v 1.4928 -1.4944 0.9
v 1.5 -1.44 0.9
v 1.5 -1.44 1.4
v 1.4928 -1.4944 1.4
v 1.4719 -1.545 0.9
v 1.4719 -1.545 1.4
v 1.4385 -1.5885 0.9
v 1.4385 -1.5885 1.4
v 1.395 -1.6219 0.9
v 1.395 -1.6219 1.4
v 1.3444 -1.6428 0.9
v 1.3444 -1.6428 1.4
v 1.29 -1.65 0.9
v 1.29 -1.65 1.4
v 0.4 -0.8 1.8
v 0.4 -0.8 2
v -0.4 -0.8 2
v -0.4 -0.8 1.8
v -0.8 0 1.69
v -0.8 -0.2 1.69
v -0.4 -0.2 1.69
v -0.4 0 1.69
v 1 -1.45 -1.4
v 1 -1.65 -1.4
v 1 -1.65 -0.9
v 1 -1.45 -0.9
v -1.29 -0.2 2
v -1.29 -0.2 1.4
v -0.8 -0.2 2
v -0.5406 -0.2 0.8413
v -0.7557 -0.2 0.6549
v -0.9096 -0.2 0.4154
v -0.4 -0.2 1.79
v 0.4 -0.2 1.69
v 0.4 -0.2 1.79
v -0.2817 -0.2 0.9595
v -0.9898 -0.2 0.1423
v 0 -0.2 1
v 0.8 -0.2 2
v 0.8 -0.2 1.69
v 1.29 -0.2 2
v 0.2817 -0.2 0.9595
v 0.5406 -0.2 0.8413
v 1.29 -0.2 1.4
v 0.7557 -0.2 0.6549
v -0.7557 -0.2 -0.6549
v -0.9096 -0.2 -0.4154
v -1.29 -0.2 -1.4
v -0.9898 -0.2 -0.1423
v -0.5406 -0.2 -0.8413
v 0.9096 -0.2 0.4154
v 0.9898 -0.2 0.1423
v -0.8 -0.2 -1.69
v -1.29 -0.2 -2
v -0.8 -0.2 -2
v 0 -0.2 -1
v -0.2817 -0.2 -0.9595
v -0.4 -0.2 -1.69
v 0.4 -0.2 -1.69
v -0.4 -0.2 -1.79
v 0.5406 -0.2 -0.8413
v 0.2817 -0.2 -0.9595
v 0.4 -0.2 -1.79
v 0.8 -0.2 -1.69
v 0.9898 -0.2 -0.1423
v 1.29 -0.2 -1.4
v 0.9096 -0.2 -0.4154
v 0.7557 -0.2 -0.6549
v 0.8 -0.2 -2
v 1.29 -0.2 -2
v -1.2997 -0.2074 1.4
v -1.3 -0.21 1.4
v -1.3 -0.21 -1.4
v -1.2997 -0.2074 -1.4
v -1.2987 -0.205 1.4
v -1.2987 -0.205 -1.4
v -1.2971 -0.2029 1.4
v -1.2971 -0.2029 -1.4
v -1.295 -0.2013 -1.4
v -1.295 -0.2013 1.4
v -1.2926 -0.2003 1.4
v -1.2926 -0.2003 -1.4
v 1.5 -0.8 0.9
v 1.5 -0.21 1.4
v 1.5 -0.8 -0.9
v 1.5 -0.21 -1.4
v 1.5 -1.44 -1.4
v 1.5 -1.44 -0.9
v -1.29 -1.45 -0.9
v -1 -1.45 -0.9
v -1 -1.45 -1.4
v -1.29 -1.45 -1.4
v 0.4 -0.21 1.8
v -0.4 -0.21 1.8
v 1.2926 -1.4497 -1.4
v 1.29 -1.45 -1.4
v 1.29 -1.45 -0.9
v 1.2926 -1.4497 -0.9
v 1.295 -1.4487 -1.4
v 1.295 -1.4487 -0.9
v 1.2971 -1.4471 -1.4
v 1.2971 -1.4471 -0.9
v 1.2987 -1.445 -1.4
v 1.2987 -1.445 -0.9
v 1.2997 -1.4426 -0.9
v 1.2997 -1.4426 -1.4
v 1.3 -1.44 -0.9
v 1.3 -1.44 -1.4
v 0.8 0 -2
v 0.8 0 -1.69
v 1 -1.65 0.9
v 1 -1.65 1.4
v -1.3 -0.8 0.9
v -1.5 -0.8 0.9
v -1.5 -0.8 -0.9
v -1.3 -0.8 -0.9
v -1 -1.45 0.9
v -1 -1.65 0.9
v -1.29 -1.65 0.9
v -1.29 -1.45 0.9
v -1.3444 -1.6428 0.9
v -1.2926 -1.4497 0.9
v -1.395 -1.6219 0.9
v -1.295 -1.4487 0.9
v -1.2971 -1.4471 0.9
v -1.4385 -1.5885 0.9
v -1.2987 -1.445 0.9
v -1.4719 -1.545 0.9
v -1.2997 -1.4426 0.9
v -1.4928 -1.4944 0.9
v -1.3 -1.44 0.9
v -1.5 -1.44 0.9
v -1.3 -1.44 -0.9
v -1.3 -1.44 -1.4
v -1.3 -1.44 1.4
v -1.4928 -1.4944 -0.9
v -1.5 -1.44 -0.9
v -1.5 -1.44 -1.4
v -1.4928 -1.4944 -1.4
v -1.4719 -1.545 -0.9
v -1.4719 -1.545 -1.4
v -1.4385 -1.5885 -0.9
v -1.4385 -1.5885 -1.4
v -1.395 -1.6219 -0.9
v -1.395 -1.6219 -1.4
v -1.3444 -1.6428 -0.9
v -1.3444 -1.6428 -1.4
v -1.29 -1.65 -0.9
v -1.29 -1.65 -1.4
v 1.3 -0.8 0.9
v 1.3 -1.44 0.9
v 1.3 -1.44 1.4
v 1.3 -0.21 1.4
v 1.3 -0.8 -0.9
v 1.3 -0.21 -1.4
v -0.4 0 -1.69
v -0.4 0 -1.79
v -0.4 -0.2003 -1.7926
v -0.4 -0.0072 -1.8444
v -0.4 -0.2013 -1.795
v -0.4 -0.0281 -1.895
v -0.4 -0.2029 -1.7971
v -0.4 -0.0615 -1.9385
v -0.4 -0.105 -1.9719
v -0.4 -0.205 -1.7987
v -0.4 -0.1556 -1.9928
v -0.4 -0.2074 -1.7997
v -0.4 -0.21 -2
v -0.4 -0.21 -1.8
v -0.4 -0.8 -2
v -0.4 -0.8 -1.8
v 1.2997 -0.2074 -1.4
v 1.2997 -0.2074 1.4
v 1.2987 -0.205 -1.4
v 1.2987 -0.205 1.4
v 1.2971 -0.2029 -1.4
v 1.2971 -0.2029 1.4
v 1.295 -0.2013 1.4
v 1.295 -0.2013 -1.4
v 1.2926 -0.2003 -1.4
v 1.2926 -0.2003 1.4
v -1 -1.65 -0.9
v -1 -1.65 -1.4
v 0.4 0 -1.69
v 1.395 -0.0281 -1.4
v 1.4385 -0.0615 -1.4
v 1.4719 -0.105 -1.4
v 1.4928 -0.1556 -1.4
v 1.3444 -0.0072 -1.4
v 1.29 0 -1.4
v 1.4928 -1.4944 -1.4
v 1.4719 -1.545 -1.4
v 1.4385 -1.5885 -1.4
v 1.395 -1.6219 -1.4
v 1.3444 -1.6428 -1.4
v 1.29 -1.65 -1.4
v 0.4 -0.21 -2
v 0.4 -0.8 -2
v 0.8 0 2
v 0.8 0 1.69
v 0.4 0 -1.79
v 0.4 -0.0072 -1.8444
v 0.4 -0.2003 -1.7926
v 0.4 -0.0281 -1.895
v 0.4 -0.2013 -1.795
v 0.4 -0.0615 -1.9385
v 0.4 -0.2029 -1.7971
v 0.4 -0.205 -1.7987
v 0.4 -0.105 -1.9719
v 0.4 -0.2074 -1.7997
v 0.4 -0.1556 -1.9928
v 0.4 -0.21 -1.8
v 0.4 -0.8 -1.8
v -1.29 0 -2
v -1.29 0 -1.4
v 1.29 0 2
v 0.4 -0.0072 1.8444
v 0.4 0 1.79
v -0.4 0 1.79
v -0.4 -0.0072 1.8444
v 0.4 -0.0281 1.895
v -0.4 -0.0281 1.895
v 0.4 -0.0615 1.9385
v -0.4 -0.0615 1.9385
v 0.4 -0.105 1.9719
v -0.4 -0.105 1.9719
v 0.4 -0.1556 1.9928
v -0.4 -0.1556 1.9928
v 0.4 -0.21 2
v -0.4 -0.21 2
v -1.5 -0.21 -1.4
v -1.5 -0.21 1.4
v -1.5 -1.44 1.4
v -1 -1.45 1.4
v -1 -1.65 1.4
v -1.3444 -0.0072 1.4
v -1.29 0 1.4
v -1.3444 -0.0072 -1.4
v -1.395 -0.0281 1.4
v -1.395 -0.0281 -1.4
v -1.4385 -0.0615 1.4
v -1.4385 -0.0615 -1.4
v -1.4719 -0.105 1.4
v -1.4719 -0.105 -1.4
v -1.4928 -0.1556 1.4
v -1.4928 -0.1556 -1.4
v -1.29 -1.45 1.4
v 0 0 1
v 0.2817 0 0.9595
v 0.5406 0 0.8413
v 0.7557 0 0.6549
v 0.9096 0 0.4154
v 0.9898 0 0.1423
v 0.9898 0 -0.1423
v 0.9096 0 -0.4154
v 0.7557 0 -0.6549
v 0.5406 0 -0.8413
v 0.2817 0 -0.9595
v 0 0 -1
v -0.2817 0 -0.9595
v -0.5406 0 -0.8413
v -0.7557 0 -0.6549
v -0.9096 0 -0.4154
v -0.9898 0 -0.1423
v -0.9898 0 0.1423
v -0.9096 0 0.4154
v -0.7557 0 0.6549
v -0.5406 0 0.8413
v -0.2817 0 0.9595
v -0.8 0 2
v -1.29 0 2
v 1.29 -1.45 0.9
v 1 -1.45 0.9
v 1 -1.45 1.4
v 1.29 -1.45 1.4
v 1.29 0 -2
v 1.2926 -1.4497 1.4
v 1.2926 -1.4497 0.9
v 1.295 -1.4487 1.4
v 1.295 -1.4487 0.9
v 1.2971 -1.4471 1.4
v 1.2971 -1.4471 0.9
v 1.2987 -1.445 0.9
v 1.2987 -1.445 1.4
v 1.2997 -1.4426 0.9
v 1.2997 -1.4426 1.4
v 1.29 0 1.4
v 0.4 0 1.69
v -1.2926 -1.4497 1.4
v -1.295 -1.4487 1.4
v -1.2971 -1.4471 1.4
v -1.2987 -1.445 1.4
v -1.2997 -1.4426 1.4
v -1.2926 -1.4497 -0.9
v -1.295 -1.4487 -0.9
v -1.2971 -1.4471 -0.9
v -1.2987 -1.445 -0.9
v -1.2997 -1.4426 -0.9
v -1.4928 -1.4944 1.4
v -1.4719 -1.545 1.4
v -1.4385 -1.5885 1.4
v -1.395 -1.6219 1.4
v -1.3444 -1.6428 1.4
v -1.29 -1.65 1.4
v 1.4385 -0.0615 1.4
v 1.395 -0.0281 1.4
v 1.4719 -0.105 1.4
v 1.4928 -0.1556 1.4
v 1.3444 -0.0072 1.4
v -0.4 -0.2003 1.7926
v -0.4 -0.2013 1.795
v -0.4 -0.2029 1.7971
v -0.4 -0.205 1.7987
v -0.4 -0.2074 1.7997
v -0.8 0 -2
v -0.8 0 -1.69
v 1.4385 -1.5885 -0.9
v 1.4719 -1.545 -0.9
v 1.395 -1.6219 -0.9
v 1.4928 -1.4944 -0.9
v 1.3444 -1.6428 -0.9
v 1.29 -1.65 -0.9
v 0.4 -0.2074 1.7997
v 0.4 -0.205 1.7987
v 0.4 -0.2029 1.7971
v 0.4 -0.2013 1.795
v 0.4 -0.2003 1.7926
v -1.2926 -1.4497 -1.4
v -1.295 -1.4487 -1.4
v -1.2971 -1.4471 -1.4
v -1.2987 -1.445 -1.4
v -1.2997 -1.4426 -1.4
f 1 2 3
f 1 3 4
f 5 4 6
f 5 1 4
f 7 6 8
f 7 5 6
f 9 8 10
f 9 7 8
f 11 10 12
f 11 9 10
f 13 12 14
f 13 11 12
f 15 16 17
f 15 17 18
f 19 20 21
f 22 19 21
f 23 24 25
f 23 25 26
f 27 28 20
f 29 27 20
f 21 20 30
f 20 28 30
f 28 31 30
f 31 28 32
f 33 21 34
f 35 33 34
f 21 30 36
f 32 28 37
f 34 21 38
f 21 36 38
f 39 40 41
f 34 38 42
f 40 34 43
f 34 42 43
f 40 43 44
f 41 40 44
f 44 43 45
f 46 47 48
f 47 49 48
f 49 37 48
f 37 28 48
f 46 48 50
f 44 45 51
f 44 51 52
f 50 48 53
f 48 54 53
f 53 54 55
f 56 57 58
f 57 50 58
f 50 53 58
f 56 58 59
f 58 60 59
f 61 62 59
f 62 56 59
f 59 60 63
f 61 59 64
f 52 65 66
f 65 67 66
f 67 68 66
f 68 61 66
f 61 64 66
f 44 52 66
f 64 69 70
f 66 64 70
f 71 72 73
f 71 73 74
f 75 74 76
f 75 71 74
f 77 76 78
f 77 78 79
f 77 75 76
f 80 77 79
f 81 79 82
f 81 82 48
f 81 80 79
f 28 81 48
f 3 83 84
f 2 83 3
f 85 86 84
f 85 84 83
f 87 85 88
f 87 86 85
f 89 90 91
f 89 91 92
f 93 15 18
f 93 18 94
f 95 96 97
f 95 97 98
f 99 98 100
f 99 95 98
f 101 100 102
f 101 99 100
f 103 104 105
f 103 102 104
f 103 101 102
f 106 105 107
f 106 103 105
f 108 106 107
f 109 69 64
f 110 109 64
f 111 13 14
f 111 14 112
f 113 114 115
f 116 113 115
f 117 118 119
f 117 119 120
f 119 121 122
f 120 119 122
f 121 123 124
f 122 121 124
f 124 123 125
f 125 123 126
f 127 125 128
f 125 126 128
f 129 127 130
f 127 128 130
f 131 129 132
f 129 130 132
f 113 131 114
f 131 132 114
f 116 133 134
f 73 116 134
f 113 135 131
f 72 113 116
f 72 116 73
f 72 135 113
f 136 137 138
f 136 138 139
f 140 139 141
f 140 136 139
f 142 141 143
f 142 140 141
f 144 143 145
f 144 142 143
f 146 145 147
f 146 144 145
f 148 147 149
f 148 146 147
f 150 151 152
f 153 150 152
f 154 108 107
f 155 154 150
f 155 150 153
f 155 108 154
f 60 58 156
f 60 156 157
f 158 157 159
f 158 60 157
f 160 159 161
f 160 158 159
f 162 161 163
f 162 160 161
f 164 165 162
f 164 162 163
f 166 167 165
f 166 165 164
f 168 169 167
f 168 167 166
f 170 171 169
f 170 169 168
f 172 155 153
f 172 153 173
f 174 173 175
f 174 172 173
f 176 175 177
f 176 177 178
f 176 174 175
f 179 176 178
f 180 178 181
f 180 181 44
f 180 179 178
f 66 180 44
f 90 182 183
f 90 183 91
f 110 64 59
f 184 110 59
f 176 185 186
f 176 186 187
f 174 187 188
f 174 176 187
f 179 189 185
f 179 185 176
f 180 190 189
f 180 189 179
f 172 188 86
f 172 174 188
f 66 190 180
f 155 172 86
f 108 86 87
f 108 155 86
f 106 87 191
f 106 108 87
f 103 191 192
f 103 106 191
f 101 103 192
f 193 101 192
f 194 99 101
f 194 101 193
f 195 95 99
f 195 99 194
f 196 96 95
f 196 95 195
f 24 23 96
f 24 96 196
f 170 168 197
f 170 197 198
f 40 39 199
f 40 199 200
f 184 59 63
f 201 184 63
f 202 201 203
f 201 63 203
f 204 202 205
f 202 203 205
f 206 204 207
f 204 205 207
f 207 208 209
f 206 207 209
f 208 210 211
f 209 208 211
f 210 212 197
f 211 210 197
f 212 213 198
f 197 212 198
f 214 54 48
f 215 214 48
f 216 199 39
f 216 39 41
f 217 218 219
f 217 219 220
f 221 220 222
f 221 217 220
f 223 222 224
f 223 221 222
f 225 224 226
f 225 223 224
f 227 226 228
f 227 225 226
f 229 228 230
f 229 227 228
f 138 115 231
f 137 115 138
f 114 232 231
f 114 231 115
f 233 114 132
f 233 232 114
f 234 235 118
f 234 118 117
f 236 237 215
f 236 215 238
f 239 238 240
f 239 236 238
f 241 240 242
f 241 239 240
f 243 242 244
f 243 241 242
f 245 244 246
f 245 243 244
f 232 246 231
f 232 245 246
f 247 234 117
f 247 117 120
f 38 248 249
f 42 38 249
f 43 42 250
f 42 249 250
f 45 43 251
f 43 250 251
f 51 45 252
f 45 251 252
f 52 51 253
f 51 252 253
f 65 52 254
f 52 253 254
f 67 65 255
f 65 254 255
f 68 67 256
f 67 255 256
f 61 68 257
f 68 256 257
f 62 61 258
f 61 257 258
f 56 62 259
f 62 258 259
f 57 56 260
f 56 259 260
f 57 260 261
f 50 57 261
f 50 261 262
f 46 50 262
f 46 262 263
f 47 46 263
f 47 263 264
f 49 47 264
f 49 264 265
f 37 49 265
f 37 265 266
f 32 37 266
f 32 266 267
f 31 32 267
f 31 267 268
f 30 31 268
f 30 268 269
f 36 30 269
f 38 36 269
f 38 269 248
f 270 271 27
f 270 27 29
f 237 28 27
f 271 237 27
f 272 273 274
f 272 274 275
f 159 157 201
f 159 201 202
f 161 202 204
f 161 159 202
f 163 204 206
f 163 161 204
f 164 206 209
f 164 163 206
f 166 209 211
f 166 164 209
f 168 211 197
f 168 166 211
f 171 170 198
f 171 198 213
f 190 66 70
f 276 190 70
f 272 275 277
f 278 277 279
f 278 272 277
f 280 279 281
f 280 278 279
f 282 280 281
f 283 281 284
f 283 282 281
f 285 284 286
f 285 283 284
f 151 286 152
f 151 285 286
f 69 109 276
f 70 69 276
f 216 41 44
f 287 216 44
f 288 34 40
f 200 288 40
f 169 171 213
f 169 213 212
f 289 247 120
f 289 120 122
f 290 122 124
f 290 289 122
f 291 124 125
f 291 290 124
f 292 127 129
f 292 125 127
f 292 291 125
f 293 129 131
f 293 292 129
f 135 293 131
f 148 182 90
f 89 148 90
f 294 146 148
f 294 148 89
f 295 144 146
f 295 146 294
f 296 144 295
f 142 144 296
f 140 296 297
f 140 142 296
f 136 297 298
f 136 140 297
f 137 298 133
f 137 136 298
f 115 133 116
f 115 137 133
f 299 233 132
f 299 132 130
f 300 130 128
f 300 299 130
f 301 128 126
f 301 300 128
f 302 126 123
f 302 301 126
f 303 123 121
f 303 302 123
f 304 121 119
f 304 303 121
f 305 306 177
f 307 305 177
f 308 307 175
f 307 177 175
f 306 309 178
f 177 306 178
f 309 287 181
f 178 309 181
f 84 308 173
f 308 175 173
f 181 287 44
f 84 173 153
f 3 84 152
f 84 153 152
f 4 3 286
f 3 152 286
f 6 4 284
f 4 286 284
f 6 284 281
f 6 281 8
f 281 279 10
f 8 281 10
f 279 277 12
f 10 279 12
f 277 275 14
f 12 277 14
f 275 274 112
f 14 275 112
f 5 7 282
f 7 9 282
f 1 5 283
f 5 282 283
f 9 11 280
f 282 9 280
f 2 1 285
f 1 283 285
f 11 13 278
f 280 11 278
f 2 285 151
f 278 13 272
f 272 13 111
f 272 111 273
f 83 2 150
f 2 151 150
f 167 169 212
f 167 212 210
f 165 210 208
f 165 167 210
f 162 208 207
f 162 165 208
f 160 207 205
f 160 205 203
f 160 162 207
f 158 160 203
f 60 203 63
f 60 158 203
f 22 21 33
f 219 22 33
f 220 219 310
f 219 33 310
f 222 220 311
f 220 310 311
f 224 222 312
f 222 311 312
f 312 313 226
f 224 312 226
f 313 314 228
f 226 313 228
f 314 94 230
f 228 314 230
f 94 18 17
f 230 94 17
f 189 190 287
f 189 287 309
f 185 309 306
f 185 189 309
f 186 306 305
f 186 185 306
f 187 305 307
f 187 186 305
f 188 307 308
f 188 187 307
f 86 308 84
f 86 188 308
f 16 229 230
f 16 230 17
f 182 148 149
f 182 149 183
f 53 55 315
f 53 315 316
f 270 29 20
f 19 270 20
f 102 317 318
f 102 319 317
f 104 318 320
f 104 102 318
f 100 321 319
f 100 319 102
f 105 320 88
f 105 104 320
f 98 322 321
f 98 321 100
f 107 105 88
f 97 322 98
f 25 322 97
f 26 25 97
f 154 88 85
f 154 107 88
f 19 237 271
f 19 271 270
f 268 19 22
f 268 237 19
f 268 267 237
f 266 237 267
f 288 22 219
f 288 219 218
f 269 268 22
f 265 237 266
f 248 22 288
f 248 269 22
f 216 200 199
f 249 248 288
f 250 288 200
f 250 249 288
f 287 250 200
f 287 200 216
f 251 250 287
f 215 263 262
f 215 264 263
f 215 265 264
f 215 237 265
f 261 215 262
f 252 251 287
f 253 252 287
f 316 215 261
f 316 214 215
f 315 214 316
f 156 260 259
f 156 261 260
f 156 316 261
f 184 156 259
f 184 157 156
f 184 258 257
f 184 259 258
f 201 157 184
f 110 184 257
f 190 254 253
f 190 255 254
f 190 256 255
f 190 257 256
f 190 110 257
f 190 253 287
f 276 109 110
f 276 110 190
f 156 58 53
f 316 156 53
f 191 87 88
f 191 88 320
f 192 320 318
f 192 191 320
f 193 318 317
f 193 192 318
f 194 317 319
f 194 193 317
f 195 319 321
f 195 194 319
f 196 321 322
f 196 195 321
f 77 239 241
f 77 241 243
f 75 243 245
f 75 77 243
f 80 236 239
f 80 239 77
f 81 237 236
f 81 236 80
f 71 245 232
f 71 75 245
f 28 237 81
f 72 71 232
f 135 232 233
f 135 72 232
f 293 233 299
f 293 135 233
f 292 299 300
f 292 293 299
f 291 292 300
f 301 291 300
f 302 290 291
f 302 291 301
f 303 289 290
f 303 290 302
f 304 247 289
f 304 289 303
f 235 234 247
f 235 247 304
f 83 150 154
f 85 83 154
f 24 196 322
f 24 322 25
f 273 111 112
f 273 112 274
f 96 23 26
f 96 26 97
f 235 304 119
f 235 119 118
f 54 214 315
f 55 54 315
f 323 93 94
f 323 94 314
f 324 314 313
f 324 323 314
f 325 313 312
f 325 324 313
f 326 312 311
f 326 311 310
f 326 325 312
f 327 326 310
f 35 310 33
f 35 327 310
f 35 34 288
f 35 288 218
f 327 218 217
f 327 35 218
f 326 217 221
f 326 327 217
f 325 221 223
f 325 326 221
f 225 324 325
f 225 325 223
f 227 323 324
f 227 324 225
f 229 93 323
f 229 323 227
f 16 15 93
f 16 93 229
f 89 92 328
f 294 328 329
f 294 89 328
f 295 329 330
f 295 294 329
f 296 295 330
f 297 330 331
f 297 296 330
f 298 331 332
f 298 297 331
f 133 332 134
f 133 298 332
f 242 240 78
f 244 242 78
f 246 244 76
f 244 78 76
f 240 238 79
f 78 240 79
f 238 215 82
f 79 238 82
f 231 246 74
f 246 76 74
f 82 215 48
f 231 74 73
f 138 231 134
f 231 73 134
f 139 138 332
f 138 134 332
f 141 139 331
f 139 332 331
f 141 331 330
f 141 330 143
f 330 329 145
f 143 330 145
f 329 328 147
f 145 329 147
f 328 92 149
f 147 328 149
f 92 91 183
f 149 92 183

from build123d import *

# Parameters (mm, degrees)
SKETCH1_W                       = 3
SKETCH1_H                       = 4
BASE_FLANGE1_DEPTH              = 0.2
EDGE_FLANGE1_STRIP_W            = 0.82
EDGE_FLANGE1_STRIP_H            = 0.2
EDGE_FLANGE1_STRIP_CUT_DEPTH    = 0.8
EDGE_FLANGE1_RELIEF_W           = 0.92
EDGE_FLANGE1_RELIEF_H           = 0.4
EDGE_FLANGE1_RELIEF_CUT_DEPTH   = 0.2
EDGE_FLANGE1_STRIP_2_W          = 0.82
EDGE_FLANGE1_STRIP_2_H          = 0.2
EDGE_FLANGE1_STRIP_CUT_2_DEPTH  = 0.8
EDGE_FLANGE1_RELIEF_2_W         = 0.92
EDGE_FLANGE1_RELIEF_2_H         = 0.4
EDGE_FLANGE1_RELIEF_CUT_2_DEPTH = 0.2
EDGE_FLANGE1_DEPTH              = 0.8
EDGE_FLANGE1_BEND_DEPTH         = 0.8
EDGE_FLANGE2_STRIP_W            = 0.82
EDGE_FLANGE2_STRIP_H            = 0.2
EDGE_FLANGE2_STRIP_CUT_DEPTH    = 2.8
EDGE_FLANGE2_RELIEF_W           = 0.82
EDGE_FLANGE2_RELIEF_H           = 0.6
EDGE_FLANGE2_RELIEF_CUT_DEPTH   = 0.2
EDGE_FLANGE2_STRIP_2_W          = 0.82
EDGE_FLANGE2_STRIP_2_H          = 0.2
EDGE_FLANGE2_STRIP_CUT_2_DEPTH  = 2.8
EDGE_FLANGE2_RELIEF_2_W         = 0.82
EDGE_FLANGE2_RELIEF_2_H         = 0.6
EDGE_FLANGE2_RELIEF_CUT_2_DEPTH = 0.2
EDGE_FLANGE2_DEPTH              = 2.8
EDGE_FLANGE2_BEND_DEPTH         = 2.8
EDGE_FLANGE3_STRIP_W            = 0.82
EDGE_FLANGE3_STRIP_H            = 0.2
EDGE_FLANGE3_STRIP_CUT_DEPTH    = 2.8
EDGE_FLANGE3_STRIP_2_W          = 0.82
EDGE_FLANGE3_STRIP_2_H          = 0.2
EDGE_FLANGE3_STRIP_CUT_2_DEPTH  = 2.8
EDGE_FLANGE3_DEPTH              = 2.8
EDGE_FLANGE3_BEND_DEPTH         = 2.8
CUT_EXTRUDE1_DEPTH              = 10
CUT_EXTRUDE1_DEPTH_BACK         = 10
SKETCH23_W                      = 1.8
SKETCH23_H                      = 0.85
SKETCH24_R                      = 1
CUT_EXTRUDE2_DEPTH              = 10


# Sheet-metal steps are written as plain solids
with BuildPart() as part:
    # Sketch1 → Base-Flange1 (new body)
    with BuildSketch(Plane(origin=(0, 0, 0), x_dir=(1, 0, 0), z_dir=(0, 1, 0))):
        Rectangle(SKETCH1_W, SKETCH1_H)
    extrude(amount=-BASE_FLANGE1_DEPTH)

    # Edge-Flange1 strip (across the edge) → Edge-Flange1 strip cut (cut)
    with BuildSketch(Plane(origin=(0.4, -0.2, 2), x_dir=(0, 0, -1), z_dir=(-1, 0, 0))):
        with Locations((-0.2, -0.1)):
            Rectangle(EDGE_FLANGE1_STRIP_W, EDGE_FLANGE1_STRIP_H)
    extrude(amount=EDGE_FLANGE1_STRIP_CUT_DEPTH, mode=Mode.SUBTRACT)

    # Edge-Flange1 relief (on the sheet) → Edge-Flange1 relief cut (cut)
    with BuildSketch(Plane(origin=(0.4, -0.2, 1.79), x_dir=(0, 0, -1), z_dir=(0, -1, 0))):
        with Locations((-0.36, 0.2)):
            Rectangle(EDGE_FLANGE1_RELIEF_W, EDGE_FLANGE1_RELIEF_H)
        with Locations((-0.36, -1)):
            Rectangle(EDGE_FLANGE1_RELIEF_W, EDGE_FLANGE1_RELIEF_H)
    extrude(amount=-EDGE_FLANGE1_RELIEF_CUT_DEPTH, mode=Mode.SUBTRACT)

    # Edge-Flange1 strip 2 (across the edge) → Edge-Flange1 strip cut 2 (cut)
    with BuildSketch(Plane(origin=(-0.4, -0.2, -2), x_dir=(0, 0, 1), z_dir=(1, 0, 0))):
        with Locations((-0.2, -0.1)):
            Rectangle(EDGE_FLANGE1_STRIP_2_W, EDGE_FLANGE1_STRIP_2_H)
    extrude(amount=EDGE_FLANGE1_STRIP_CUT_2_DEPTH, mode=Mode.SUBTRACT)

    # Edge-Flange1 relief 2 (on the sheet) → Edge-Flange1 relief cut 2 (cut)
    with BuildSketch(Plane(origin=(-0.4, -0.2, -1.79), x_dir=(0, 0, 1), z_dir=(0, -1, 0))):
        with Locations((-0.36, 0.2)):
            Rectangle(EDGE_FLANGE1_RELIEF_2_W, EDGE_FLANGE1_RELIEF_2_H)
        with Locations((-0.36, -1)):
            Rectangle(EDGE_FLANGE1_RELIEF_2_W, EDGE_FLANGE1_RELIEF_2_H)
    extrude(amount=-EDGE_FLANGE1_RELIEF_CUT_2_DEPTH, mode=Mode.SUBTRACT)

    # Edge-Flange1 section (across the edge) → Edge-Flange1 (add)
    with BuildSketch(Plane(origin=(0.4, -0.2, 2), x_dir=(0, 0, -1), z_dir=(-1, 0, 0))):
        with BuildLine():
            Line((0, 0.01), (0, 0.6))
            Line((0, 0.6), (0.2, 0.6))
            Line((0.2, 0.6), (0.2, 0.01))
            ThreePointArc((0.2, 0.01), (0.202928932, 0.002928932), (0.21, 0))
            Line((0.21, 0), (0.21, -0.2))
            ThreePointArc((0.21, -0.2), (0.061507576, -0.138492424), (0, 0.01))
        make_face()
    extrude(amount=EDGE_FLANGE1_DEPTH)

    # Edge-Flange1 section 2 (across the edge) → Edge-Flange1 bend (add)
    with BuildSketch(Plane(origin=(-0.4, -0.2, -2), x_dir=(0, 0, 1), z_dir=(1, 0, 0))):
        with BuildLine():
            Line((0, 0.01), (0, 0.6))
            Line((0, 0.6), (0.2, 0.6))
            Line((0.2, 0.6), (0.2, 0.01))
            ThreePointArc((0.2, 0.01), (0.202928932, 0.002928932), (0.21, 0))
            Line((0.21, 0), (0.21, -0.2))
            ThreePointArc((0.21, -0.2), (0.061507576, -0.138492424), (0, 0.01))
        make_face()
    extrude(amount=EDGE_FLANGE1_BEND_DEPTH)

    # Edge-Flange2 strip (across the edge) → Edge-Flange2 strip cut (cut)
    with BuildSketch(Plane(origin=(-1.5, -0.2, 1.4), x_dir=(1, 0, 0), z_dir=(0, 0, -1))):
        with Locations((-0.2, -0.1)):
            Rectangle(EDGE_FLANGE2_STRIP_W, EDGE_FLANGE2_STRIP_H)
    extrude(amount=EDGE_FLANGE2_STRIP_CUT_DEPTH, mode=Mode.SUBTRACT)

    # Edge-Flange2 relief (on the sheet) → Edge-Flange2 relief cut (cut)
    with BuildSketch(Plane(origin=(-1.29, -0.2, 1.4), x_dir=(1, 0, 0), z_dir=(0, -1, 0))):
        with Locations((-0.41, 0.3)):
            Rectangle(EDGE_FLANGE2_RELIEF_W, EDGE_FLANGE2_RELIEF_H)
        with Locations((-0.41, -3.1)):
            Rectangle(EDGE_FLANGE2_RELIEF_W, EDGE_FLANGE2_RELIEF_H)
    extrude(amount=-EDGE_FLANGE2_RELIEF_CUT_DEPTH, mode=Mode.SUBTRACT)

    # Edge-Flange2 strip 2 (across the edge) → Edge-Flange2 strip cut 2 (cut)
    with BuildSketch(Plane(origin=(1.5, -0.2, -1.4), x_dir=(-1, 0, 0), z_dir=(0, 0, 1))):
        with Locations((-0.2, -0.1)):
            Rectangle(EDGE_FLANGE2_STRIP_2_W, EDGE_FLANGE2_STRIP_2_H)
    extrude(amount=EDGE_FLANGE2_STRIP_CUT_2_DEPTH, mode=Mode.SUBTRACT)

    # Edge-Flange2 relief 2 (on the sheet) → Edge-Flange2 relief cut 2 (cut)
    with BuildSketch(Plane(origin=(1.29, -0.2, -1.4), x_dir=(-1, 0, 0), z_dir=(0, -1, 0))):
        with Locations((-0.41, 0.3)):
            Rectangle(EDGE_FLANGE2_RELIEF_2_W, EDGE_FLANGE2_RELIEF_2_H)
        with Locations((-0.41, -3.1)):
            Rectangle(EDGE_FLANGE2_RELIEF_2_W, EDGE_FLANGE2_RELIEF_2_H)
    extrude(amount=-EDGE_FLANGE2_RELIEF_CUT_2_DEPTH, mode=Mode.SUBTRACT)

    # Edge-Flange2 section (across the edge) → Edge-Flange2 (add)
    with BuildSketch(Plane(origin=(-1.5, -0.2, 1.4), x_dir=(1, 0, 0), z_dir=(0, 0, -1))):
        with BuildLine():
            Line((0, 0.01), (0, 1.45))
            Line((0, 1.45), (0.2, 1.45))
            Line((0.2, 1.45), (0.2, 0.01))
            ThreePointArc((0.2, 0.01), (0.202928932, 0.002928932), (0.21, 0))
            Line((0.21, 0), (0.21, -0.2))
            ThreePointArc((0.21, -0.2), (0.061507576, -0.138492424), (0, 0.01))
        make_face()
    extrude(amount=EDGE_FLANGE2_DEPTH)

    # Edge-Flange2 section 2 (across the edge) → Edge-Flange2 bend (add)
    with BuildSketch(Plane(origin=(1.5, -0.2, -1.4), x_dir=(-1, 0, 0), z_dir=(0, 0, 1))):
        with BuildLine():
            Line((0, 0.01), (0, 1.45))
            Line((0, 1.45), (0.2, 1.45))
            Line((0.2, 1.45), (0.2, 0.01))
            ThreePointArc((0.2, 0.01), (0.202928932, 0.002928932), (0.21, 0))
            Line((0.21, 0), (0.21, -0.2))
            ThreePointArc((0.21, -0.2), (0.061507576, -0.138492424), (0, 0.01))
        make_face()
    extrude(amount=EDGE_FLANGE2_BEND_DEPTH)

    # Edge-Flange3 strip (across the edge) → Edge-Flange3 strip cut (cut)
    with BuildSketch(Plane(origin=(-1.3, -1.65, 1.4), x_dir=(0, 1, 0), z_dir=(0, 0, -1))):
        with Locations((-0.2, -0.1)):
            Rectangle(EDGE_FLANGE3_STRIP_W, EDGE_FLANGE3_STRIP_H)
    extrude(amount=EDGE_FLANGE3_STRIP_CUT_DEPTH, mode=Mode.SUBTRACT)

    # Edge-Flange3 strip 2 (across the edge) → Edge-Flange3 strip cut 2 (cut)
    with BuildSketch(Plane(origin=(1.3, -1.65, -1.4), x_dir=(0, 1, 0), z_dir=(0, 0, 1))):
        with Locations((-0.2, -0.1)):
            Rectangle(EDGE_FLANGE3_STRIP_2_W, EDGE_FLANGE3_STRIP_2_H)
    extrude(amount=EDGE_FLANGE3_STRIP_CUT_2_DEPTH, mode=Mode.SUBTRACT)

    # Edge-Flange3 section (across the edge) → Edge-Flange3 (add)
    with BuildSketch(Plane(origin=(-1.3, -1.65, 1.4), x_dir=(0, 1, 0), z_dir=(0, 0, -1))):
        with BuildLine():
            Line((0, 0.01), (0, 0.3))
            Line((0, 0.3), (0.2, 0.3))
            Line((0.2, 0.3), (0.2, 0.01))
            ThreePointArc((0.2, 0.01), (0.202928932, 0.002928932), (0.21, 0))
            Line((0.21, 0), (0.21, -0.2))
            ThreePointArc((0.21, -0.2), (0.061507576, -0.138492424), (0, 0.01))
        make_face()
    extrude(amount=EDGE_FLANGE3_DEPTH)

    # Edge-Flange3 section 2 (across the edge) → Edge-Flange3 bend (add)
    with BuildSketch(Plane(origin=(1.3, -1.65, -1.4), x_dir=(0, 1, 0), z_dir=(0, 0, 1))):
        with BuildLine():
            Line((0, 0.01), (0, 0.3))
            Line((0, 0.3), (0.2, 0.3))
            Line((0.2, 0.3), (0.2, 0.01))
            ThreePointArc((0.2, 0.01), (0.202928932, 0.002928932), (0.21, 0))
            Line((0.21, 0), (0.21, -0.2))
            ThreePointArc((0.21, -0.2), (0.061507576, -0.138492424), (0, 0.01))
        make_face()
    extrude(amount=EDGE_FLANGE3_BEND_DEPTH)

    # Sketch23 → Cut-Extrude1 (cut, two sides: drawn at the far end of the back side and taken through both)
    with BuildSketch(Plane(origin=(0, 0, 0), x_dir=(0, 0, -1), z_dir=(1, 0, 0)).offset(-CUT_EXTRUDE1_DEPTH_BACK)):
        with Locations((0, -1.225)):
            Rectangle(SKETCH23_W, SKETCH23_H)
    extrude(amount=CUT_EXTRUDE1_DEPTH + CUT_EXTRUDE1_DEPTH_BACK, mode=Mode.SUBTRACT)

    # Sketch24 → Cut-Extrude2 (cut)
    with BuildSketch(Plane(origin=(0, 0, 0), x_dir=(1, 0, 0), z_dir=(0, 1, 0))):
        with Locations(Location((0, 0, 0), (0, 0, 270))):
            Circle(SKETCH24_R)
    extrude(amount=-CUT_EXTRUDE2_DEPTH, mode=Mode.SUBTRACT)


solid = part.part
